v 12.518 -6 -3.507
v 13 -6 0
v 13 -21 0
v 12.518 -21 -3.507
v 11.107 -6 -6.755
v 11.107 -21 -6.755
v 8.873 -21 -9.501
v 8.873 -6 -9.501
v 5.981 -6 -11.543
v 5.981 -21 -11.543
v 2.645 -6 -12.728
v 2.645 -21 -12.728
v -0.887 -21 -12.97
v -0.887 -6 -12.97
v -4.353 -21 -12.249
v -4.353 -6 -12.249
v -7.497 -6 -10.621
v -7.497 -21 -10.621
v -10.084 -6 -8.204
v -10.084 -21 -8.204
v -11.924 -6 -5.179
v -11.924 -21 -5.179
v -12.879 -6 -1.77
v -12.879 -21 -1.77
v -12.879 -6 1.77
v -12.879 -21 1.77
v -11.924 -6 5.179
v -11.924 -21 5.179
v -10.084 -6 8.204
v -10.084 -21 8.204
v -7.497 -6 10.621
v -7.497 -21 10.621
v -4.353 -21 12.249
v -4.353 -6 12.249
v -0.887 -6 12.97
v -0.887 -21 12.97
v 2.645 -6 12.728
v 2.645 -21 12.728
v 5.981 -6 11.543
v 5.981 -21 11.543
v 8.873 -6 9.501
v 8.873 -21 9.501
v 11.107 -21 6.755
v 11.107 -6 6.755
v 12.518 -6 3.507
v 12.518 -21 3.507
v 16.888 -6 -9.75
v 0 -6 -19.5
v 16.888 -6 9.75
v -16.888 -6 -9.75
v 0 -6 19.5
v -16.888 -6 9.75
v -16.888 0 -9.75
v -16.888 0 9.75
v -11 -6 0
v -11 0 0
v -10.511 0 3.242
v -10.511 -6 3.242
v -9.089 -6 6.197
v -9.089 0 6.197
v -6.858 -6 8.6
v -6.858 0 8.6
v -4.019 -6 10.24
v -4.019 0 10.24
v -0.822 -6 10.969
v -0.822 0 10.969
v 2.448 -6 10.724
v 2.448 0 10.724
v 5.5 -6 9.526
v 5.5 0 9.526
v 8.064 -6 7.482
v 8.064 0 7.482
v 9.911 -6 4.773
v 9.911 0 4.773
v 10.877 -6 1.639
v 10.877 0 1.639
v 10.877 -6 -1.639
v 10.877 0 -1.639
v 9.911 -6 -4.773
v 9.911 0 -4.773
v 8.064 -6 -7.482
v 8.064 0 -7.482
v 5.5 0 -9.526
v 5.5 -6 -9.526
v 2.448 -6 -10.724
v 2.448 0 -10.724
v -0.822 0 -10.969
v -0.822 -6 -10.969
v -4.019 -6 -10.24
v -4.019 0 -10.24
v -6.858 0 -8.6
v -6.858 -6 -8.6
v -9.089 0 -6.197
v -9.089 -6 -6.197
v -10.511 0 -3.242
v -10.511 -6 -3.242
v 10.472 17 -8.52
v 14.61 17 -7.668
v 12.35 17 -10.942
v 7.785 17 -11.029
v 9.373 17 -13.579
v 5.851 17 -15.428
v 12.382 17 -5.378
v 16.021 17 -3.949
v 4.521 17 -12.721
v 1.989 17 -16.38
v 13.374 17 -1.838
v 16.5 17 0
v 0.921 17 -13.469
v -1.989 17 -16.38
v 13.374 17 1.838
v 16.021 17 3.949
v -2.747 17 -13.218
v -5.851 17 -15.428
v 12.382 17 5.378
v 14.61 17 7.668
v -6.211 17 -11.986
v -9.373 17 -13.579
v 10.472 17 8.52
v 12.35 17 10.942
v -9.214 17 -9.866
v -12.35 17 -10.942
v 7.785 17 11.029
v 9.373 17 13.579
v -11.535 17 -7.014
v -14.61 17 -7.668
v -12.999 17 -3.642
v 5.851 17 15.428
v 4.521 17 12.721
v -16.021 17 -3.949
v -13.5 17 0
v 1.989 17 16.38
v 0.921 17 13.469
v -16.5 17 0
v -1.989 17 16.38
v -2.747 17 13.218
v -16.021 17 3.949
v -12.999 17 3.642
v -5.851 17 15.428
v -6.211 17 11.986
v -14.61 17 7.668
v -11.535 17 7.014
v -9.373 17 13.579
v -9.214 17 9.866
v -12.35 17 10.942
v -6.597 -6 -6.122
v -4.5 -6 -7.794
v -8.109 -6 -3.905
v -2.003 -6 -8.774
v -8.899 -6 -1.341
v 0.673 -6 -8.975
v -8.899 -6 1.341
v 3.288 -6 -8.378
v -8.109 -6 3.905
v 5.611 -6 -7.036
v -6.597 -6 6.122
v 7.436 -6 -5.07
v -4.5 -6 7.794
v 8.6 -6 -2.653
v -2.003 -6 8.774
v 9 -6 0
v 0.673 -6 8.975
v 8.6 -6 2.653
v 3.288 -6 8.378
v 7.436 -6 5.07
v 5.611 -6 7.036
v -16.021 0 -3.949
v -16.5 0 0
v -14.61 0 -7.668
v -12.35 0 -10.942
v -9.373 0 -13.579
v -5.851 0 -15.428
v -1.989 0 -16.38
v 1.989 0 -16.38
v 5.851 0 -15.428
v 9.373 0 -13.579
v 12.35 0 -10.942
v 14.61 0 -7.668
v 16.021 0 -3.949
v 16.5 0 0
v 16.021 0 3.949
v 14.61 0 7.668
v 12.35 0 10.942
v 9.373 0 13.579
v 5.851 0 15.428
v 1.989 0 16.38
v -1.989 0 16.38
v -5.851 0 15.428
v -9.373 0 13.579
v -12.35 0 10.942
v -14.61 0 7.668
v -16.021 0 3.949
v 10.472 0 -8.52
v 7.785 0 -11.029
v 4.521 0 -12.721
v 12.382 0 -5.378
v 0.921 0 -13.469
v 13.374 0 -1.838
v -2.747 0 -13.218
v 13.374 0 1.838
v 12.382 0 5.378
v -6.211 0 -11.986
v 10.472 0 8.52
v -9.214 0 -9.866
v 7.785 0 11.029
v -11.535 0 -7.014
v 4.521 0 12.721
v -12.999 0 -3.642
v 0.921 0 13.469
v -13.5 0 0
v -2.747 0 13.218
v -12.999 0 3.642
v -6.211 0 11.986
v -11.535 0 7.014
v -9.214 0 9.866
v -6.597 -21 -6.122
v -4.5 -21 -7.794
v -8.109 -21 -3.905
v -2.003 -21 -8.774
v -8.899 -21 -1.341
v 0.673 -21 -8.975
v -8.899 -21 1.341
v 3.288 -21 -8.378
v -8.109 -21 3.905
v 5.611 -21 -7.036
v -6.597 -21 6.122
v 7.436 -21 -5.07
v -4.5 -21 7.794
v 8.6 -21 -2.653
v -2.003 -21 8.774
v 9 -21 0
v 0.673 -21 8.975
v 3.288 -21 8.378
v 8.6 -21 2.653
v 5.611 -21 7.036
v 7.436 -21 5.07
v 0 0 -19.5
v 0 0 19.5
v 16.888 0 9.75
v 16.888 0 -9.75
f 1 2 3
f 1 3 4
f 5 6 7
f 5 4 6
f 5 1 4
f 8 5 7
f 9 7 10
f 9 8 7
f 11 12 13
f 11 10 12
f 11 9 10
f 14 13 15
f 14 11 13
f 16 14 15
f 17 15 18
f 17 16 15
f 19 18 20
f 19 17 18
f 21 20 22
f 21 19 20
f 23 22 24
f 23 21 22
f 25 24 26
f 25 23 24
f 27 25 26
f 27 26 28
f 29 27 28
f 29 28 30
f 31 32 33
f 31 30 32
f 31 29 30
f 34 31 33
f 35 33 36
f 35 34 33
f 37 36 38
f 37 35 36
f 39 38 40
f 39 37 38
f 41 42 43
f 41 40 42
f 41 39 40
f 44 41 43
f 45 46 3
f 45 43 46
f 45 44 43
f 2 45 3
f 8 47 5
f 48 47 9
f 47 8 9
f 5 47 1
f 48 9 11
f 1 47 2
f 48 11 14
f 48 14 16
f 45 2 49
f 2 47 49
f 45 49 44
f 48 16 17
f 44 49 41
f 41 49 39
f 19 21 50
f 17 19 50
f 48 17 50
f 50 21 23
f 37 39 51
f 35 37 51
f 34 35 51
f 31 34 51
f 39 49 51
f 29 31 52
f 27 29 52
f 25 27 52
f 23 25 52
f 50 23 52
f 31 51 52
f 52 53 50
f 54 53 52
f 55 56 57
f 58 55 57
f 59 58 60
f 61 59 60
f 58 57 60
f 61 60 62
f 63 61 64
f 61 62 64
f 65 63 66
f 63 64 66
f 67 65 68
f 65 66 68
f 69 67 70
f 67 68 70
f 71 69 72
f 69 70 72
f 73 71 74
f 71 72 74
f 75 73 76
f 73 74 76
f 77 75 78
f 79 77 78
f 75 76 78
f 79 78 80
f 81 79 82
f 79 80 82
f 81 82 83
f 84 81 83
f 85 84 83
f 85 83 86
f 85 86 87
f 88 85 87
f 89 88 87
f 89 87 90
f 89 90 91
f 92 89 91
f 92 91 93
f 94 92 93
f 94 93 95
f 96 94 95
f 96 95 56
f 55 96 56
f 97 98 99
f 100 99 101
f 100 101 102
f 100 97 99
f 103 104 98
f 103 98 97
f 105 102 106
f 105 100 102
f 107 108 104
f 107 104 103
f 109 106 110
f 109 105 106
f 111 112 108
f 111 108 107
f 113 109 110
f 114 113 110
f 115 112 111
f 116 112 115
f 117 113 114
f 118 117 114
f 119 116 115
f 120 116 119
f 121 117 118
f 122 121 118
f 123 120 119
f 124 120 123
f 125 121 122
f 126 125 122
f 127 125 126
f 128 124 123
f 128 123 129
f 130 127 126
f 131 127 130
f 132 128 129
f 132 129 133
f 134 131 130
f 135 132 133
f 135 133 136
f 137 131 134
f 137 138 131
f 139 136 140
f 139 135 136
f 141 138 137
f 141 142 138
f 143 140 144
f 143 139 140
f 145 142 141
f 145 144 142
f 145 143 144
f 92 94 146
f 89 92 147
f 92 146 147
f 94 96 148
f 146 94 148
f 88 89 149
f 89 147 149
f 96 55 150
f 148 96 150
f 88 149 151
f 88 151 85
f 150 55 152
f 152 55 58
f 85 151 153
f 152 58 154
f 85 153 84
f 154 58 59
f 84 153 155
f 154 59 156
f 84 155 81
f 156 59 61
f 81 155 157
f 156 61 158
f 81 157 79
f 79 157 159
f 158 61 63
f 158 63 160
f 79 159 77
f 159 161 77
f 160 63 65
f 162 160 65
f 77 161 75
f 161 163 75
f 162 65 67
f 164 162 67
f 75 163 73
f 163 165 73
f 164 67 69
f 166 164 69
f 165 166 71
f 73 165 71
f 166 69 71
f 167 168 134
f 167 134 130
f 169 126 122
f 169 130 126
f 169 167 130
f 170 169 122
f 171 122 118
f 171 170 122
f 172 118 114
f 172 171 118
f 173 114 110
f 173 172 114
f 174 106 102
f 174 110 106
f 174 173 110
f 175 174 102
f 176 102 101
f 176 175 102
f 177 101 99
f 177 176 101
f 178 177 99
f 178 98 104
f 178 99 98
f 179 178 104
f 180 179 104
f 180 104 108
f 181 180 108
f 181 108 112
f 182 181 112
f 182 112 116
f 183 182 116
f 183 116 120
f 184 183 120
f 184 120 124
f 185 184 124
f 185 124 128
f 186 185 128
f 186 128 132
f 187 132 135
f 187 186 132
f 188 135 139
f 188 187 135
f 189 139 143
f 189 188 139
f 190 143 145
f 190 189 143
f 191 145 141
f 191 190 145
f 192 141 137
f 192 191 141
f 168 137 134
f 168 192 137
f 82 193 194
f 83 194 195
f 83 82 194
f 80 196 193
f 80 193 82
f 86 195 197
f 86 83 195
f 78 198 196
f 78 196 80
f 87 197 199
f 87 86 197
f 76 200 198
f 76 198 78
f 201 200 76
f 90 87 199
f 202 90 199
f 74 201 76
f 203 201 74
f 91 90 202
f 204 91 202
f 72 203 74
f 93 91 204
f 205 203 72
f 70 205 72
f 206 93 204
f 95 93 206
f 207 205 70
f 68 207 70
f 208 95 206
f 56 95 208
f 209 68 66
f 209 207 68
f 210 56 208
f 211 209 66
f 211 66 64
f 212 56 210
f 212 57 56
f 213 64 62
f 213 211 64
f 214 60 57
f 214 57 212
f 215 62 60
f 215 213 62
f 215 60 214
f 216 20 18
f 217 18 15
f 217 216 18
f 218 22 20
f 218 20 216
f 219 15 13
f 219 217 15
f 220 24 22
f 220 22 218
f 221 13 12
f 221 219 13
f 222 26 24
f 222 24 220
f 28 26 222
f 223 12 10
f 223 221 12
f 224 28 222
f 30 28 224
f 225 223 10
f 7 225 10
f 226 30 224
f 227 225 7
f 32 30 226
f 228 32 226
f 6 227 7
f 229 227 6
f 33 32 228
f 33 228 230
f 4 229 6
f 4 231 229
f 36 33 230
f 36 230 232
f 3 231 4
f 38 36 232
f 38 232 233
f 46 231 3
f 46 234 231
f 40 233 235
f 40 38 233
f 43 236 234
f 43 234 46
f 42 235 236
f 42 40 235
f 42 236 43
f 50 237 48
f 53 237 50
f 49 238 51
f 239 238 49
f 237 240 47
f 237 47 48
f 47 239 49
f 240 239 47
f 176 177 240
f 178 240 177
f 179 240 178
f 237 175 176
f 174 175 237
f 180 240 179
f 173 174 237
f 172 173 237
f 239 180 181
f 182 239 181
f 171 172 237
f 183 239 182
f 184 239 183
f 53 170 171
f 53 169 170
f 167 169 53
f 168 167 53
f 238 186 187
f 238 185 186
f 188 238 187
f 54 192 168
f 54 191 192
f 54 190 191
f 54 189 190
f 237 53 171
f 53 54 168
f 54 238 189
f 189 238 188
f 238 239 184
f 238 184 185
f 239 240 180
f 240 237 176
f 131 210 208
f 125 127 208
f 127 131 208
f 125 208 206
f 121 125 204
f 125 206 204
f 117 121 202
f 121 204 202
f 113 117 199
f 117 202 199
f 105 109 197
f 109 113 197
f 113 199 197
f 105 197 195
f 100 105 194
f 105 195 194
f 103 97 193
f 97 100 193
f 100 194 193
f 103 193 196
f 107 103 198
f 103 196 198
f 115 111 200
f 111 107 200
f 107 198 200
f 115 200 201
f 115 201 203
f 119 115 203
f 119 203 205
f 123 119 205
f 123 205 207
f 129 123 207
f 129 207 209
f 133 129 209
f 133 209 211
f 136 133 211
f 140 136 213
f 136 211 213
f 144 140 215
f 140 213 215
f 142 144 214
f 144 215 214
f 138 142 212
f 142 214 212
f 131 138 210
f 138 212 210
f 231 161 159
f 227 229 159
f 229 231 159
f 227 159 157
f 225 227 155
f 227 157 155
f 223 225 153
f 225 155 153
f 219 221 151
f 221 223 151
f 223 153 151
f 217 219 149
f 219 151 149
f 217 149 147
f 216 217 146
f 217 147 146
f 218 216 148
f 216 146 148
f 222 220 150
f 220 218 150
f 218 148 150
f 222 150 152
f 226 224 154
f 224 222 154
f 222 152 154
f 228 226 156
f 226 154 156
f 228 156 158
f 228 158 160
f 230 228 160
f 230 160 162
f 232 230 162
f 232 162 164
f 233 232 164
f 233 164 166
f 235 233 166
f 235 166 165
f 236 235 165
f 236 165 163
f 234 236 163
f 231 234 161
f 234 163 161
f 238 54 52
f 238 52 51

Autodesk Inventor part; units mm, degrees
ref_plane "YZ Plane" through (0, 0, 0) normal (1, 0, 0) x (0, 1, 0)
ref_plane "XZ Plane" through (0, 0, 0) normal (0, 1, 0) x (-1, 0, 0)
ref_plane "XY Plane" through (0, 0, 0) normal (0, 0, 1) x (1, 0, 0)
sketch "Sketch1" plane through (0, 0, 0) normal (0, 1, 0) x (-1, 0, 0)
  circle A0 centre (0, 0) radius 13.5
  circle A1 centre (0, 0) radius 16.5
  dimension "d0" = 27
  dimension "d1" = 33
extrude "pipeEnd" add sketch "Sketch1" along normal blind 17
sketch "Sketch2" plane through (0, 0, 0) normal (0, 1, 0) x (-1, 0, 0)
  circle A0 centre (0, 0) radius 19.5 construction
  line L0 (16.8875, -9.75) -> (16.8875, 9.75)
  line L1 (16.8875, 9.75) -> (0, 19.5)
  line L2 (0, 19.5) -> (-16.8875, 9.75)
  line L3 (-16.8875, 9.75) -> (-16.8875, -9.75)
  line L4 (-16.8875, -9.75) -> (0, -19.5)
  line L5 (0, -19.5) -> (16.8875, -9.75)
  circle A1 centre (0, 0) radius 11
  dimension "d4" = 39
  dimension "d12" = 22
extrude "hexBit" add sketch "Sketch2" against normal blind 6
sketch "Sketch3" plane through (0, -6, 0) normal (0, -1, 0) x (1, 0, 0)
  circle A0 centre (0, 0) radius 9
  circle A1 centre (0, 0) radius 13
  dimension "d7" = 18
  dimension "d8" = 26
extrude "thread" add sketch "Sketch3" along normal blind 15
thread "Thread1" size "G 3/4-14" class "A" standard "BSP Pipe Threads" full length
sketch "pinsPlacement" plane through (0, -21, 0) normal (0, -1, 0) x (1, 0, 0)
  point P0 (0, 0)
  point P1 (0, 0)
properties part number "PVCConnectorMale3_4inch"
